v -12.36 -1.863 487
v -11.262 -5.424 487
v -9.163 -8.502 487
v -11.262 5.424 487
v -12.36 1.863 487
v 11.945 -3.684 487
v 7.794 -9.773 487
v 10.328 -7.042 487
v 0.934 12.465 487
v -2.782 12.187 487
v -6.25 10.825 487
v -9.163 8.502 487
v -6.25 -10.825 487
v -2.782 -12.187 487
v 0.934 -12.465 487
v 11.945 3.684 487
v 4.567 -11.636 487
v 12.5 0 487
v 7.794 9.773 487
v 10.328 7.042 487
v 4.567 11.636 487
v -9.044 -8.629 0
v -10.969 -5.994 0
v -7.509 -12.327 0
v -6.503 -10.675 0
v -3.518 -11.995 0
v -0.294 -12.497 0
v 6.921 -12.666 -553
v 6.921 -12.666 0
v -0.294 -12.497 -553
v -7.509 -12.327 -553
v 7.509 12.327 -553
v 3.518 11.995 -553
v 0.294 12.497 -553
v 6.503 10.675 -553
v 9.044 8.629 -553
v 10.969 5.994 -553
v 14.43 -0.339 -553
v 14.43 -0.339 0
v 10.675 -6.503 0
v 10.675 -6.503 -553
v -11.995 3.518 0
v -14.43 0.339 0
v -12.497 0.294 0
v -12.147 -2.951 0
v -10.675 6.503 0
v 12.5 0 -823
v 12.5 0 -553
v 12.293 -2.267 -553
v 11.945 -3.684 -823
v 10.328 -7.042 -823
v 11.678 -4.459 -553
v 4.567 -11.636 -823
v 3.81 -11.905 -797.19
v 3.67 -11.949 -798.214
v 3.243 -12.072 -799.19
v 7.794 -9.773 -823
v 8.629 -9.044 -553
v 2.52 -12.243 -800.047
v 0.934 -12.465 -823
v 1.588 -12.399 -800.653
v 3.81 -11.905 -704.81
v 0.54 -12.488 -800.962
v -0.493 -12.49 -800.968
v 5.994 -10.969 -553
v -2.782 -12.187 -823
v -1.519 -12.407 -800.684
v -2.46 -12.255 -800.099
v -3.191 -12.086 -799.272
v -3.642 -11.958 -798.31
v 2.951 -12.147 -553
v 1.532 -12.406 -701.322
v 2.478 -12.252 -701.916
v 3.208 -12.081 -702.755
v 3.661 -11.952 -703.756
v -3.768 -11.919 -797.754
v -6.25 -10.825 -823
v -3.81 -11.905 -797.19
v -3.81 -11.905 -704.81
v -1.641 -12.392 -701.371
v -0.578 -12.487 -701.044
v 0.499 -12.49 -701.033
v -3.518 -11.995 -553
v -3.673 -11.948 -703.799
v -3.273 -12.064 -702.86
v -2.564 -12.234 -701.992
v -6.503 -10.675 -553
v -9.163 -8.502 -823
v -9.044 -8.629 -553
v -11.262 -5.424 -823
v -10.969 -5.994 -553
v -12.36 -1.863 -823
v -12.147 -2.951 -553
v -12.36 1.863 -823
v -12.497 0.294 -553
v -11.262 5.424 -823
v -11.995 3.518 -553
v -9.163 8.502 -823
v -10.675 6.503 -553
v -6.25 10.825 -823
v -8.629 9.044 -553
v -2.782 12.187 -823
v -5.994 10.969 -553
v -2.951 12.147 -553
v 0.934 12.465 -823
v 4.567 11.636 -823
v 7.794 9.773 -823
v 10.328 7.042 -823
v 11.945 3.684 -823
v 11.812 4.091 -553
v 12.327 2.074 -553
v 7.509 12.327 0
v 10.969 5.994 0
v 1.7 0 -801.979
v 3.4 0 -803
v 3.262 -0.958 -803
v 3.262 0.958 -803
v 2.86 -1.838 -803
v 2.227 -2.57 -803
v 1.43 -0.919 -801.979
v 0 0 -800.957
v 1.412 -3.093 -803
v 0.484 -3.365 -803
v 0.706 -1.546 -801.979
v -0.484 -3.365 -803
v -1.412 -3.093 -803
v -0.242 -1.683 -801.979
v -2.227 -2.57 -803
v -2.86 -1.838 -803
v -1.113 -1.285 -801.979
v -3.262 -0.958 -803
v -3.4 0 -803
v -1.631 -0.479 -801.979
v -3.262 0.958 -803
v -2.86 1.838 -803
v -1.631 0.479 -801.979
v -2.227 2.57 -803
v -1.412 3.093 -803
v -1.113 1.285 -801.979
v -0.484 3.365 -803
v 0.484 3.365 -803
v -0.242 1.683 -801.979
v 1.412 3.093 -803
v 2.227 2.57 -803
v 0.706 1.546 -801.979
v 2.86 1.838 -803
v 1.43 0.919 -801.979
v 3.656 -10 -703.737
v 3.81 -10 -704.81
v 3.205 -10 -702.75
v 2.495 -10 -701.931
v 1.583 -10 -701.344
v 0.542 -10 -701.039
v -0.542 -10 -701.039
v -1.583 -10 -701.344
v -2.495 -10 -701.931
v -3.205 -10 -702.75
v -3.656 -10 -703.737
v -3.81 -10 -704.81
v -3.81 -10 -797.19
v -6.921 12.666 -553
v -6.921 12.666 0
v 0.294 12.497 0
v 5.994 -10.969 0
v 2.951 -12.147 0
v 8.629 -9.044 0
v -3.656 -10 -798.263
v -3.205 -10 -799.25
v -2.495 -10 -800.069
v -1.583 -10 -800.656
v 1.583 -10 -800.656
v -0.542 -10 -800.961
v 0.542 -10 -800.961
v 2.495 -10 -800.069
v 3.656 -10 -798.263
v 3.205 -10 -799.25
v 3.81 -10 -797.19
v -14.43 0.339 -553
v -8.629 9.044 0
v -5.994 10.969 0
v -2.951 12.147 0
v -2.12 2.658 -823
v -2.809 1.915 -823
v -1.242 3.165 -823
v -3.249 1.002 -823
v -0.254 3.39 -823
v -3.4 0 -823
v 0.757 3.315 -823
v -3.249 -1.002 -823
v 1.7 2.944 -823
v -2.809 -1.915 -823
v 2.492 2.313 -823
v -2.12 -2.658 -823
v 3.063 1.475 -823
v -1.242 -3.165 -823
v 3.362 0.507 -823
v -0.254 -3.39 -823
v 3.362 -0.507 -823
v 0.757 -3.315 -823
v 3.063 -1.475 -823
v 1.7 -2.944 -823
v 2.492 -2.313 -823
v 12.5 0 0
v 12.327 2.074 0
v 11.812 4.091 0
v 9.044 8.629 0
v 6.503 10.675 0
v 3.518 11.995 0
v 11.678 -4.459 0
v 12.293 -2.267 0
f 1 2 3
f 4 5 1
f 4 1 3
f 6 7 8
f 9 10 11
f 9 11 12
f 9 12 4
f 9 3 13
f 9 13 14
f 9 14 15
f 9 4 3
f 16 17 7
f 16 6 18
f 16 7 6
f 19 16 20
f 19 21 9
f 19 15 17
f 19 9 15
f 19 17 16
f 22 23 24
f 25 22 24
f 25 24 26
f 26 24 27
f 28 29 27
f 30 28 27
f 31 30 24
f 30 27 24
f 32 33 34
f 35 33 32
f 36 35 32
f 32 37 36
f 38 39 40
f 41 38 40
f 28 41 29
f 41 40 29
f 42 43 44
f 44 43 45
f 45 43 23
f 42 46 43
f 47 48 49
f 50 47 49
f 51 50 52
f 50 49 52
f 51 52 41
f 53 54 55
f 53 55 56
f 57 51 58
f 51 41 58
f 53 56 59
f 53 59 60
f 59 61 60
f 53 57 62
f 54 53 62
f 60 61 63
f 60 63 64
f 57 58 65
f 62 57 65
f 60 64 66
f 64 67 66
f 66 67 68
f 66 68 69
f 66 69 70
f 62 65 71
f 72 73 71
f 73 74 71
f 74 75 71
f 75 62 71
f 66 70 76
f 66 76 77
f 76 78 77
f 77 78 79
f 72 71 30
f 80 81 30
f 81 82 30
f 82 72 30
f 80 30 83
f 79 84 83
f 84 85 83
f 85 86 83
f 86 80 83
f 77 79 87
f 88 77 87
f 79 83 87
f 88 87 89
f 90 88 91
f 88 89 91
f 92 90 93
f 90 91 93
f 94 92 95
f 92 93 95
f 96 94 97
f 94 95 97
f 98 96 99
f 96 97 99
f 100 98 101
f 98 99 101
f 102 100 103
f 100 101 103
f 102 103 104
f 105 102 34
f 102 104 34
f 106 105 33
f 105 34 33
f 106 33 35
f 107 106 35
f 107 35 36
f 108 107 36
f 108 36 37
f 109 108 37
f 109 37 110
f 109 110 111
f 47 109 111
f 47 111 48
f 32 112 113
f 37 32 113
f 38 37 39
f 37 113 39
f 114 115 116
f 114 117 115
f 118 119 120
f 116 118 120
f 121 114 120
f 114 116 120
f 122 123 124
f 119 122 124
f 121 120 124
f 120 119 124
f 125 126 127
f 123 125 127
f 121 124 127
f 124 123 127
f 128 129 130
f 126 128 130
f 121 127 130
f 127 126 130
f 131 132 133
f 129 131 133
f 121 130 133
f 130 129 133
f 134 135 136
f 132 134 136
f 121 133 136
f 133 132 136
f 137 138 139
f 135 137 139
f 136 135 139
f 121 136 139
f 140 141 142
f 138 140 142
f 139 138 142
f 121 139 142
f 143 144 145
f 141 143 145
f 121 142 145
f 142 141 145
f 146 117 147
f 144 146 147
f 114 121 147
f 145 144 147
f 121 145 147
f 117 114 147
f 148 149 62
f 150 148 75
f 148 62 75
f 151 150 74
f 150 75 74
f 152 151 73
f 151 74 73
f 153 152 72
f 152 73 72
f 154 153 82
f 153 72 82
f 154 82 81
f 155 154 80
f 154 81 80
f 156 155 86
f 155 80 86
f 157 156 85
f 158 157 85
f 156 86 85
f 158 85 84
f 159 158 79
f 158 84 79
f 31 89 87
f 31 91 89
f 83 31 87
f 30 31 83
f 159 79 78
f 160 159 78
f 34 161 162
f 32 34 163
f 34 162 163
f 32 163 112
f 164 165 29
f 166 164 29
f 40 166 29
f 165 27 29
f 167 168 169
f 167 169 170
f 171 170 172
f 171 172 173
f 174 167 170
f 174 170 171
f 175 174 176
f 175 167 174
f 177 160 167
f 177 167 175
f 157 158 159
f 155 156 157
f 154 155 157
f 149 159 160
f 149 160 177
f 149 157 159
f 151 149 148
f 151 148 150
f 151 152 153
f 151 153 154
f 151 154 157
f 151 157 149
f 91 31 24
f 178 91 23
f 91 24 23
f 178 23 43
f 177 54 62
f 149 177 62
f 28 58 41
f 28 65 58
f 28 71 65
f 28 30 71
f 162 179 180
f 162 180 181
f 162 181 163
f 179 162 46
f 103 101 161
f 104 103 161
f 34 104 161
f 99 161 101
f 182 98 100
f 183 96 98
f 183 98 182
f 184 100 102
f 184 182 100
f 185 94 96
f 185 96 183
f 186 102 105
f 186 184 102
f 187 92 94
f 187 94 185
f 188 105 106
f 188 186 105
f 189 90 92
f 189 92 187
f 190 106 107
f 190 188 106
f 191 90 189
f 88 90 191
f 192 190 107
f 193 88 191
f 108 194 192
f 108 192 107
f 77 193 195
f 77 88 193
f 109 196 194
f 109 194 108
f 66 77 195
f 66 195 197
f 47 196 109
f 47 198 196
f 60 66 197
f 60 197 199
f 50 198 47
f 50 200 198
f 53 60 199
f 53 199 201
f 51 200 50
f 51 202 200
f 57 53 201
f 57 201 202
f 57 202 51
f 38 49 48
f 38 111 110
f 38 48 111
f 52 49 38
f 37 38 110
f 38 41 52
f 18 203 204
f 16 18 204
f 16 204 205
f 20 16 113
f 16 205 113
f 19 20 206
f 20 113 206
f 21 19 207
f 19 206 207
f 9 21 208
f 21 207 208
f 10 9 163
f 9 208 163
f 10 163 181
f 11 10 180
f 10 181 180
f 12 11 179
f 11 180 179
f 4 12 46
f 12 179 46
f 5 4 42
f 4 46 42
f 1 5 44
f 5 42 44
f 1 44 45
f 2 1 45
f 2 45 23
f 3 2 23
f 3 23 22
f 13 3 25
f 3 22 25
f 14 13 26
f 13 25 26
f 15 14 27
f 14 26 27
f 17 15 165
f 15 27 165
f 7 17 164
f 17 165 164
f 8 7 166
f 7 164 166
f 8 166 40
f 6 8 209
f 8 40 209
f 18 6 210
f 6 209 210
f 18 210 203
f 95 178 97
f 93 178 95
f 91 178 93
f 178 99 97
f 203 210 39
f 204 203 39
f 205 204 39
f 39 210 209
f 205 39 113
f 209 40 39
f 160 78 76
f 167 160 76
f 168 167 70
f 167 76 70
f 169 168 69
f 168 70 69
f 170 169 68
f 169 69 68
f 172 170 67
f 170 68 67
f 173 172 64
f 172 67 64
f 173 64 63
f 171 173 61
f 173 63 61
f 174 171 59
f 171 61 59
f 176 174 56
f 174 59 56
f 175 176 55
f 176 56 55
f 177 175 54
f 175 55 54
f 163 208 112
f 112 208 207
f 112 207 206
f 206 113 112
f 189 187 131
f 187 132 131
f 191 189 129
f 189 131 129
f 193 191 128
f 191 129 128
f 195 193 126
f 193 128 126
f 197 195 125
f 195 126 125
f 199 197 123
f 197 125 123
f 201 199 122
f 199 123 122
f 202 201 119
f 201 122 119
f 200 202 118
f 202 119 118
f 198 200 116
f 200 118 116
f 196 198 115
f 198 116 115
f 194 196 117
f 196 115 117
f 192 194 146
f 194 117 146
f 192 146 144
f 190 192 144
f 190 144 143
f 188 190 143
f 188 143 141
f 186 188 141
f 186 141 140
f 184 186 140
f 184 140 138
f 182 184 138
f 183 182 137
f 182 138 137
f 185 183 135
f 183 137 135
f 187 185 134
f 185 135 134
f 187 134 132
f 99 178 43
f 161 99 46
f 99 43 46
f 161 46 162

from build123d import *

# Parameters (mm, degrees)
F0_R      = 12.5
F1_DEPTH  = 462
F2_R      = 12.5
F3_DEPTH  = 25
F5_DEPTH  = 553
F6_R      = 12.5
F7_DEPTH  = 270
F10_DEPTH = 2.5
F12_D     = 6.8
F12_DEPTH = 20
F12_TIP   = 2.0429261047


with BuildPart() as f1:
    # F0 (on Top) → F1 (new body)
    with BuildSketch(Plane.XY):
        Circle(F0_R)
    extrude(amount=F1_DEPTH)

    # F2 (on face) → F3 (join)
    with BuildSketch(Plane.XY.offset(462)):
        Circle(F2_R)
    extrude(amount=F3_DEPTH)

    # F4 (on face) → F5 (join)
    with BuildSketch(Plane(origin=(0, 0, 0), x_dir=(1, 0, 0), z_dir=(0, 0, -1))):
        Polygon((14.4297718574, 0.3391422642), (6.9211801124, 12.6661201315), (-7.508591745, 12.3269778673), (-14.4297718574, -0.3391422642), (-6.9211801124, -12.6661201315), (7.508591745, -12.3269778673), align=None)
    extrude(amount=F5_DEPTH)

    # F6 (on face) → F7 (join)
    with BuildSketch(Plane(origin=(0, 0, -553), x_dir=(1, 0, 0), z_dir=(0, 0, -1))):
        Circle(F6_R)
    extrude(amount=F7_DEPTH)

    # F9 (on offset) → F10 (cut)
    with BuildSketch(Plane.XZ.offset(12.5)):
        with BuildLine():
            ThreePointArc((-3.81, -797.19), (0, -801), (3.81, -797.19))
            Line((3.81, -797.19), (3.81, -704.81))
            ThreePointArc((3.81, -704.81), (0, -701), (-3.81, -704.81))
            Line((-3.81, -704.81), (-3.81, -797.19))
        make_face()
    extrude(amount=-F10_DEPTH, mode=Mode.SUBTRACT)

    # F12
    with Locations(Plane(origin=(0, 0, -823), x_dir=(1, 0, 0), z_dir=(0, 0, -1))):
        with Locations((0, 0)):
            Hole(F12_D / 2, depth=F12_DEPTH)
            with Locations((0, 0, -(F12_DEPTH + F12_TIP / 2))):  # 118° drill point
                Cone(0, F12_D / 2, F12_TIP, mode=Mode.SUBTRACT)


solid = f1.part
